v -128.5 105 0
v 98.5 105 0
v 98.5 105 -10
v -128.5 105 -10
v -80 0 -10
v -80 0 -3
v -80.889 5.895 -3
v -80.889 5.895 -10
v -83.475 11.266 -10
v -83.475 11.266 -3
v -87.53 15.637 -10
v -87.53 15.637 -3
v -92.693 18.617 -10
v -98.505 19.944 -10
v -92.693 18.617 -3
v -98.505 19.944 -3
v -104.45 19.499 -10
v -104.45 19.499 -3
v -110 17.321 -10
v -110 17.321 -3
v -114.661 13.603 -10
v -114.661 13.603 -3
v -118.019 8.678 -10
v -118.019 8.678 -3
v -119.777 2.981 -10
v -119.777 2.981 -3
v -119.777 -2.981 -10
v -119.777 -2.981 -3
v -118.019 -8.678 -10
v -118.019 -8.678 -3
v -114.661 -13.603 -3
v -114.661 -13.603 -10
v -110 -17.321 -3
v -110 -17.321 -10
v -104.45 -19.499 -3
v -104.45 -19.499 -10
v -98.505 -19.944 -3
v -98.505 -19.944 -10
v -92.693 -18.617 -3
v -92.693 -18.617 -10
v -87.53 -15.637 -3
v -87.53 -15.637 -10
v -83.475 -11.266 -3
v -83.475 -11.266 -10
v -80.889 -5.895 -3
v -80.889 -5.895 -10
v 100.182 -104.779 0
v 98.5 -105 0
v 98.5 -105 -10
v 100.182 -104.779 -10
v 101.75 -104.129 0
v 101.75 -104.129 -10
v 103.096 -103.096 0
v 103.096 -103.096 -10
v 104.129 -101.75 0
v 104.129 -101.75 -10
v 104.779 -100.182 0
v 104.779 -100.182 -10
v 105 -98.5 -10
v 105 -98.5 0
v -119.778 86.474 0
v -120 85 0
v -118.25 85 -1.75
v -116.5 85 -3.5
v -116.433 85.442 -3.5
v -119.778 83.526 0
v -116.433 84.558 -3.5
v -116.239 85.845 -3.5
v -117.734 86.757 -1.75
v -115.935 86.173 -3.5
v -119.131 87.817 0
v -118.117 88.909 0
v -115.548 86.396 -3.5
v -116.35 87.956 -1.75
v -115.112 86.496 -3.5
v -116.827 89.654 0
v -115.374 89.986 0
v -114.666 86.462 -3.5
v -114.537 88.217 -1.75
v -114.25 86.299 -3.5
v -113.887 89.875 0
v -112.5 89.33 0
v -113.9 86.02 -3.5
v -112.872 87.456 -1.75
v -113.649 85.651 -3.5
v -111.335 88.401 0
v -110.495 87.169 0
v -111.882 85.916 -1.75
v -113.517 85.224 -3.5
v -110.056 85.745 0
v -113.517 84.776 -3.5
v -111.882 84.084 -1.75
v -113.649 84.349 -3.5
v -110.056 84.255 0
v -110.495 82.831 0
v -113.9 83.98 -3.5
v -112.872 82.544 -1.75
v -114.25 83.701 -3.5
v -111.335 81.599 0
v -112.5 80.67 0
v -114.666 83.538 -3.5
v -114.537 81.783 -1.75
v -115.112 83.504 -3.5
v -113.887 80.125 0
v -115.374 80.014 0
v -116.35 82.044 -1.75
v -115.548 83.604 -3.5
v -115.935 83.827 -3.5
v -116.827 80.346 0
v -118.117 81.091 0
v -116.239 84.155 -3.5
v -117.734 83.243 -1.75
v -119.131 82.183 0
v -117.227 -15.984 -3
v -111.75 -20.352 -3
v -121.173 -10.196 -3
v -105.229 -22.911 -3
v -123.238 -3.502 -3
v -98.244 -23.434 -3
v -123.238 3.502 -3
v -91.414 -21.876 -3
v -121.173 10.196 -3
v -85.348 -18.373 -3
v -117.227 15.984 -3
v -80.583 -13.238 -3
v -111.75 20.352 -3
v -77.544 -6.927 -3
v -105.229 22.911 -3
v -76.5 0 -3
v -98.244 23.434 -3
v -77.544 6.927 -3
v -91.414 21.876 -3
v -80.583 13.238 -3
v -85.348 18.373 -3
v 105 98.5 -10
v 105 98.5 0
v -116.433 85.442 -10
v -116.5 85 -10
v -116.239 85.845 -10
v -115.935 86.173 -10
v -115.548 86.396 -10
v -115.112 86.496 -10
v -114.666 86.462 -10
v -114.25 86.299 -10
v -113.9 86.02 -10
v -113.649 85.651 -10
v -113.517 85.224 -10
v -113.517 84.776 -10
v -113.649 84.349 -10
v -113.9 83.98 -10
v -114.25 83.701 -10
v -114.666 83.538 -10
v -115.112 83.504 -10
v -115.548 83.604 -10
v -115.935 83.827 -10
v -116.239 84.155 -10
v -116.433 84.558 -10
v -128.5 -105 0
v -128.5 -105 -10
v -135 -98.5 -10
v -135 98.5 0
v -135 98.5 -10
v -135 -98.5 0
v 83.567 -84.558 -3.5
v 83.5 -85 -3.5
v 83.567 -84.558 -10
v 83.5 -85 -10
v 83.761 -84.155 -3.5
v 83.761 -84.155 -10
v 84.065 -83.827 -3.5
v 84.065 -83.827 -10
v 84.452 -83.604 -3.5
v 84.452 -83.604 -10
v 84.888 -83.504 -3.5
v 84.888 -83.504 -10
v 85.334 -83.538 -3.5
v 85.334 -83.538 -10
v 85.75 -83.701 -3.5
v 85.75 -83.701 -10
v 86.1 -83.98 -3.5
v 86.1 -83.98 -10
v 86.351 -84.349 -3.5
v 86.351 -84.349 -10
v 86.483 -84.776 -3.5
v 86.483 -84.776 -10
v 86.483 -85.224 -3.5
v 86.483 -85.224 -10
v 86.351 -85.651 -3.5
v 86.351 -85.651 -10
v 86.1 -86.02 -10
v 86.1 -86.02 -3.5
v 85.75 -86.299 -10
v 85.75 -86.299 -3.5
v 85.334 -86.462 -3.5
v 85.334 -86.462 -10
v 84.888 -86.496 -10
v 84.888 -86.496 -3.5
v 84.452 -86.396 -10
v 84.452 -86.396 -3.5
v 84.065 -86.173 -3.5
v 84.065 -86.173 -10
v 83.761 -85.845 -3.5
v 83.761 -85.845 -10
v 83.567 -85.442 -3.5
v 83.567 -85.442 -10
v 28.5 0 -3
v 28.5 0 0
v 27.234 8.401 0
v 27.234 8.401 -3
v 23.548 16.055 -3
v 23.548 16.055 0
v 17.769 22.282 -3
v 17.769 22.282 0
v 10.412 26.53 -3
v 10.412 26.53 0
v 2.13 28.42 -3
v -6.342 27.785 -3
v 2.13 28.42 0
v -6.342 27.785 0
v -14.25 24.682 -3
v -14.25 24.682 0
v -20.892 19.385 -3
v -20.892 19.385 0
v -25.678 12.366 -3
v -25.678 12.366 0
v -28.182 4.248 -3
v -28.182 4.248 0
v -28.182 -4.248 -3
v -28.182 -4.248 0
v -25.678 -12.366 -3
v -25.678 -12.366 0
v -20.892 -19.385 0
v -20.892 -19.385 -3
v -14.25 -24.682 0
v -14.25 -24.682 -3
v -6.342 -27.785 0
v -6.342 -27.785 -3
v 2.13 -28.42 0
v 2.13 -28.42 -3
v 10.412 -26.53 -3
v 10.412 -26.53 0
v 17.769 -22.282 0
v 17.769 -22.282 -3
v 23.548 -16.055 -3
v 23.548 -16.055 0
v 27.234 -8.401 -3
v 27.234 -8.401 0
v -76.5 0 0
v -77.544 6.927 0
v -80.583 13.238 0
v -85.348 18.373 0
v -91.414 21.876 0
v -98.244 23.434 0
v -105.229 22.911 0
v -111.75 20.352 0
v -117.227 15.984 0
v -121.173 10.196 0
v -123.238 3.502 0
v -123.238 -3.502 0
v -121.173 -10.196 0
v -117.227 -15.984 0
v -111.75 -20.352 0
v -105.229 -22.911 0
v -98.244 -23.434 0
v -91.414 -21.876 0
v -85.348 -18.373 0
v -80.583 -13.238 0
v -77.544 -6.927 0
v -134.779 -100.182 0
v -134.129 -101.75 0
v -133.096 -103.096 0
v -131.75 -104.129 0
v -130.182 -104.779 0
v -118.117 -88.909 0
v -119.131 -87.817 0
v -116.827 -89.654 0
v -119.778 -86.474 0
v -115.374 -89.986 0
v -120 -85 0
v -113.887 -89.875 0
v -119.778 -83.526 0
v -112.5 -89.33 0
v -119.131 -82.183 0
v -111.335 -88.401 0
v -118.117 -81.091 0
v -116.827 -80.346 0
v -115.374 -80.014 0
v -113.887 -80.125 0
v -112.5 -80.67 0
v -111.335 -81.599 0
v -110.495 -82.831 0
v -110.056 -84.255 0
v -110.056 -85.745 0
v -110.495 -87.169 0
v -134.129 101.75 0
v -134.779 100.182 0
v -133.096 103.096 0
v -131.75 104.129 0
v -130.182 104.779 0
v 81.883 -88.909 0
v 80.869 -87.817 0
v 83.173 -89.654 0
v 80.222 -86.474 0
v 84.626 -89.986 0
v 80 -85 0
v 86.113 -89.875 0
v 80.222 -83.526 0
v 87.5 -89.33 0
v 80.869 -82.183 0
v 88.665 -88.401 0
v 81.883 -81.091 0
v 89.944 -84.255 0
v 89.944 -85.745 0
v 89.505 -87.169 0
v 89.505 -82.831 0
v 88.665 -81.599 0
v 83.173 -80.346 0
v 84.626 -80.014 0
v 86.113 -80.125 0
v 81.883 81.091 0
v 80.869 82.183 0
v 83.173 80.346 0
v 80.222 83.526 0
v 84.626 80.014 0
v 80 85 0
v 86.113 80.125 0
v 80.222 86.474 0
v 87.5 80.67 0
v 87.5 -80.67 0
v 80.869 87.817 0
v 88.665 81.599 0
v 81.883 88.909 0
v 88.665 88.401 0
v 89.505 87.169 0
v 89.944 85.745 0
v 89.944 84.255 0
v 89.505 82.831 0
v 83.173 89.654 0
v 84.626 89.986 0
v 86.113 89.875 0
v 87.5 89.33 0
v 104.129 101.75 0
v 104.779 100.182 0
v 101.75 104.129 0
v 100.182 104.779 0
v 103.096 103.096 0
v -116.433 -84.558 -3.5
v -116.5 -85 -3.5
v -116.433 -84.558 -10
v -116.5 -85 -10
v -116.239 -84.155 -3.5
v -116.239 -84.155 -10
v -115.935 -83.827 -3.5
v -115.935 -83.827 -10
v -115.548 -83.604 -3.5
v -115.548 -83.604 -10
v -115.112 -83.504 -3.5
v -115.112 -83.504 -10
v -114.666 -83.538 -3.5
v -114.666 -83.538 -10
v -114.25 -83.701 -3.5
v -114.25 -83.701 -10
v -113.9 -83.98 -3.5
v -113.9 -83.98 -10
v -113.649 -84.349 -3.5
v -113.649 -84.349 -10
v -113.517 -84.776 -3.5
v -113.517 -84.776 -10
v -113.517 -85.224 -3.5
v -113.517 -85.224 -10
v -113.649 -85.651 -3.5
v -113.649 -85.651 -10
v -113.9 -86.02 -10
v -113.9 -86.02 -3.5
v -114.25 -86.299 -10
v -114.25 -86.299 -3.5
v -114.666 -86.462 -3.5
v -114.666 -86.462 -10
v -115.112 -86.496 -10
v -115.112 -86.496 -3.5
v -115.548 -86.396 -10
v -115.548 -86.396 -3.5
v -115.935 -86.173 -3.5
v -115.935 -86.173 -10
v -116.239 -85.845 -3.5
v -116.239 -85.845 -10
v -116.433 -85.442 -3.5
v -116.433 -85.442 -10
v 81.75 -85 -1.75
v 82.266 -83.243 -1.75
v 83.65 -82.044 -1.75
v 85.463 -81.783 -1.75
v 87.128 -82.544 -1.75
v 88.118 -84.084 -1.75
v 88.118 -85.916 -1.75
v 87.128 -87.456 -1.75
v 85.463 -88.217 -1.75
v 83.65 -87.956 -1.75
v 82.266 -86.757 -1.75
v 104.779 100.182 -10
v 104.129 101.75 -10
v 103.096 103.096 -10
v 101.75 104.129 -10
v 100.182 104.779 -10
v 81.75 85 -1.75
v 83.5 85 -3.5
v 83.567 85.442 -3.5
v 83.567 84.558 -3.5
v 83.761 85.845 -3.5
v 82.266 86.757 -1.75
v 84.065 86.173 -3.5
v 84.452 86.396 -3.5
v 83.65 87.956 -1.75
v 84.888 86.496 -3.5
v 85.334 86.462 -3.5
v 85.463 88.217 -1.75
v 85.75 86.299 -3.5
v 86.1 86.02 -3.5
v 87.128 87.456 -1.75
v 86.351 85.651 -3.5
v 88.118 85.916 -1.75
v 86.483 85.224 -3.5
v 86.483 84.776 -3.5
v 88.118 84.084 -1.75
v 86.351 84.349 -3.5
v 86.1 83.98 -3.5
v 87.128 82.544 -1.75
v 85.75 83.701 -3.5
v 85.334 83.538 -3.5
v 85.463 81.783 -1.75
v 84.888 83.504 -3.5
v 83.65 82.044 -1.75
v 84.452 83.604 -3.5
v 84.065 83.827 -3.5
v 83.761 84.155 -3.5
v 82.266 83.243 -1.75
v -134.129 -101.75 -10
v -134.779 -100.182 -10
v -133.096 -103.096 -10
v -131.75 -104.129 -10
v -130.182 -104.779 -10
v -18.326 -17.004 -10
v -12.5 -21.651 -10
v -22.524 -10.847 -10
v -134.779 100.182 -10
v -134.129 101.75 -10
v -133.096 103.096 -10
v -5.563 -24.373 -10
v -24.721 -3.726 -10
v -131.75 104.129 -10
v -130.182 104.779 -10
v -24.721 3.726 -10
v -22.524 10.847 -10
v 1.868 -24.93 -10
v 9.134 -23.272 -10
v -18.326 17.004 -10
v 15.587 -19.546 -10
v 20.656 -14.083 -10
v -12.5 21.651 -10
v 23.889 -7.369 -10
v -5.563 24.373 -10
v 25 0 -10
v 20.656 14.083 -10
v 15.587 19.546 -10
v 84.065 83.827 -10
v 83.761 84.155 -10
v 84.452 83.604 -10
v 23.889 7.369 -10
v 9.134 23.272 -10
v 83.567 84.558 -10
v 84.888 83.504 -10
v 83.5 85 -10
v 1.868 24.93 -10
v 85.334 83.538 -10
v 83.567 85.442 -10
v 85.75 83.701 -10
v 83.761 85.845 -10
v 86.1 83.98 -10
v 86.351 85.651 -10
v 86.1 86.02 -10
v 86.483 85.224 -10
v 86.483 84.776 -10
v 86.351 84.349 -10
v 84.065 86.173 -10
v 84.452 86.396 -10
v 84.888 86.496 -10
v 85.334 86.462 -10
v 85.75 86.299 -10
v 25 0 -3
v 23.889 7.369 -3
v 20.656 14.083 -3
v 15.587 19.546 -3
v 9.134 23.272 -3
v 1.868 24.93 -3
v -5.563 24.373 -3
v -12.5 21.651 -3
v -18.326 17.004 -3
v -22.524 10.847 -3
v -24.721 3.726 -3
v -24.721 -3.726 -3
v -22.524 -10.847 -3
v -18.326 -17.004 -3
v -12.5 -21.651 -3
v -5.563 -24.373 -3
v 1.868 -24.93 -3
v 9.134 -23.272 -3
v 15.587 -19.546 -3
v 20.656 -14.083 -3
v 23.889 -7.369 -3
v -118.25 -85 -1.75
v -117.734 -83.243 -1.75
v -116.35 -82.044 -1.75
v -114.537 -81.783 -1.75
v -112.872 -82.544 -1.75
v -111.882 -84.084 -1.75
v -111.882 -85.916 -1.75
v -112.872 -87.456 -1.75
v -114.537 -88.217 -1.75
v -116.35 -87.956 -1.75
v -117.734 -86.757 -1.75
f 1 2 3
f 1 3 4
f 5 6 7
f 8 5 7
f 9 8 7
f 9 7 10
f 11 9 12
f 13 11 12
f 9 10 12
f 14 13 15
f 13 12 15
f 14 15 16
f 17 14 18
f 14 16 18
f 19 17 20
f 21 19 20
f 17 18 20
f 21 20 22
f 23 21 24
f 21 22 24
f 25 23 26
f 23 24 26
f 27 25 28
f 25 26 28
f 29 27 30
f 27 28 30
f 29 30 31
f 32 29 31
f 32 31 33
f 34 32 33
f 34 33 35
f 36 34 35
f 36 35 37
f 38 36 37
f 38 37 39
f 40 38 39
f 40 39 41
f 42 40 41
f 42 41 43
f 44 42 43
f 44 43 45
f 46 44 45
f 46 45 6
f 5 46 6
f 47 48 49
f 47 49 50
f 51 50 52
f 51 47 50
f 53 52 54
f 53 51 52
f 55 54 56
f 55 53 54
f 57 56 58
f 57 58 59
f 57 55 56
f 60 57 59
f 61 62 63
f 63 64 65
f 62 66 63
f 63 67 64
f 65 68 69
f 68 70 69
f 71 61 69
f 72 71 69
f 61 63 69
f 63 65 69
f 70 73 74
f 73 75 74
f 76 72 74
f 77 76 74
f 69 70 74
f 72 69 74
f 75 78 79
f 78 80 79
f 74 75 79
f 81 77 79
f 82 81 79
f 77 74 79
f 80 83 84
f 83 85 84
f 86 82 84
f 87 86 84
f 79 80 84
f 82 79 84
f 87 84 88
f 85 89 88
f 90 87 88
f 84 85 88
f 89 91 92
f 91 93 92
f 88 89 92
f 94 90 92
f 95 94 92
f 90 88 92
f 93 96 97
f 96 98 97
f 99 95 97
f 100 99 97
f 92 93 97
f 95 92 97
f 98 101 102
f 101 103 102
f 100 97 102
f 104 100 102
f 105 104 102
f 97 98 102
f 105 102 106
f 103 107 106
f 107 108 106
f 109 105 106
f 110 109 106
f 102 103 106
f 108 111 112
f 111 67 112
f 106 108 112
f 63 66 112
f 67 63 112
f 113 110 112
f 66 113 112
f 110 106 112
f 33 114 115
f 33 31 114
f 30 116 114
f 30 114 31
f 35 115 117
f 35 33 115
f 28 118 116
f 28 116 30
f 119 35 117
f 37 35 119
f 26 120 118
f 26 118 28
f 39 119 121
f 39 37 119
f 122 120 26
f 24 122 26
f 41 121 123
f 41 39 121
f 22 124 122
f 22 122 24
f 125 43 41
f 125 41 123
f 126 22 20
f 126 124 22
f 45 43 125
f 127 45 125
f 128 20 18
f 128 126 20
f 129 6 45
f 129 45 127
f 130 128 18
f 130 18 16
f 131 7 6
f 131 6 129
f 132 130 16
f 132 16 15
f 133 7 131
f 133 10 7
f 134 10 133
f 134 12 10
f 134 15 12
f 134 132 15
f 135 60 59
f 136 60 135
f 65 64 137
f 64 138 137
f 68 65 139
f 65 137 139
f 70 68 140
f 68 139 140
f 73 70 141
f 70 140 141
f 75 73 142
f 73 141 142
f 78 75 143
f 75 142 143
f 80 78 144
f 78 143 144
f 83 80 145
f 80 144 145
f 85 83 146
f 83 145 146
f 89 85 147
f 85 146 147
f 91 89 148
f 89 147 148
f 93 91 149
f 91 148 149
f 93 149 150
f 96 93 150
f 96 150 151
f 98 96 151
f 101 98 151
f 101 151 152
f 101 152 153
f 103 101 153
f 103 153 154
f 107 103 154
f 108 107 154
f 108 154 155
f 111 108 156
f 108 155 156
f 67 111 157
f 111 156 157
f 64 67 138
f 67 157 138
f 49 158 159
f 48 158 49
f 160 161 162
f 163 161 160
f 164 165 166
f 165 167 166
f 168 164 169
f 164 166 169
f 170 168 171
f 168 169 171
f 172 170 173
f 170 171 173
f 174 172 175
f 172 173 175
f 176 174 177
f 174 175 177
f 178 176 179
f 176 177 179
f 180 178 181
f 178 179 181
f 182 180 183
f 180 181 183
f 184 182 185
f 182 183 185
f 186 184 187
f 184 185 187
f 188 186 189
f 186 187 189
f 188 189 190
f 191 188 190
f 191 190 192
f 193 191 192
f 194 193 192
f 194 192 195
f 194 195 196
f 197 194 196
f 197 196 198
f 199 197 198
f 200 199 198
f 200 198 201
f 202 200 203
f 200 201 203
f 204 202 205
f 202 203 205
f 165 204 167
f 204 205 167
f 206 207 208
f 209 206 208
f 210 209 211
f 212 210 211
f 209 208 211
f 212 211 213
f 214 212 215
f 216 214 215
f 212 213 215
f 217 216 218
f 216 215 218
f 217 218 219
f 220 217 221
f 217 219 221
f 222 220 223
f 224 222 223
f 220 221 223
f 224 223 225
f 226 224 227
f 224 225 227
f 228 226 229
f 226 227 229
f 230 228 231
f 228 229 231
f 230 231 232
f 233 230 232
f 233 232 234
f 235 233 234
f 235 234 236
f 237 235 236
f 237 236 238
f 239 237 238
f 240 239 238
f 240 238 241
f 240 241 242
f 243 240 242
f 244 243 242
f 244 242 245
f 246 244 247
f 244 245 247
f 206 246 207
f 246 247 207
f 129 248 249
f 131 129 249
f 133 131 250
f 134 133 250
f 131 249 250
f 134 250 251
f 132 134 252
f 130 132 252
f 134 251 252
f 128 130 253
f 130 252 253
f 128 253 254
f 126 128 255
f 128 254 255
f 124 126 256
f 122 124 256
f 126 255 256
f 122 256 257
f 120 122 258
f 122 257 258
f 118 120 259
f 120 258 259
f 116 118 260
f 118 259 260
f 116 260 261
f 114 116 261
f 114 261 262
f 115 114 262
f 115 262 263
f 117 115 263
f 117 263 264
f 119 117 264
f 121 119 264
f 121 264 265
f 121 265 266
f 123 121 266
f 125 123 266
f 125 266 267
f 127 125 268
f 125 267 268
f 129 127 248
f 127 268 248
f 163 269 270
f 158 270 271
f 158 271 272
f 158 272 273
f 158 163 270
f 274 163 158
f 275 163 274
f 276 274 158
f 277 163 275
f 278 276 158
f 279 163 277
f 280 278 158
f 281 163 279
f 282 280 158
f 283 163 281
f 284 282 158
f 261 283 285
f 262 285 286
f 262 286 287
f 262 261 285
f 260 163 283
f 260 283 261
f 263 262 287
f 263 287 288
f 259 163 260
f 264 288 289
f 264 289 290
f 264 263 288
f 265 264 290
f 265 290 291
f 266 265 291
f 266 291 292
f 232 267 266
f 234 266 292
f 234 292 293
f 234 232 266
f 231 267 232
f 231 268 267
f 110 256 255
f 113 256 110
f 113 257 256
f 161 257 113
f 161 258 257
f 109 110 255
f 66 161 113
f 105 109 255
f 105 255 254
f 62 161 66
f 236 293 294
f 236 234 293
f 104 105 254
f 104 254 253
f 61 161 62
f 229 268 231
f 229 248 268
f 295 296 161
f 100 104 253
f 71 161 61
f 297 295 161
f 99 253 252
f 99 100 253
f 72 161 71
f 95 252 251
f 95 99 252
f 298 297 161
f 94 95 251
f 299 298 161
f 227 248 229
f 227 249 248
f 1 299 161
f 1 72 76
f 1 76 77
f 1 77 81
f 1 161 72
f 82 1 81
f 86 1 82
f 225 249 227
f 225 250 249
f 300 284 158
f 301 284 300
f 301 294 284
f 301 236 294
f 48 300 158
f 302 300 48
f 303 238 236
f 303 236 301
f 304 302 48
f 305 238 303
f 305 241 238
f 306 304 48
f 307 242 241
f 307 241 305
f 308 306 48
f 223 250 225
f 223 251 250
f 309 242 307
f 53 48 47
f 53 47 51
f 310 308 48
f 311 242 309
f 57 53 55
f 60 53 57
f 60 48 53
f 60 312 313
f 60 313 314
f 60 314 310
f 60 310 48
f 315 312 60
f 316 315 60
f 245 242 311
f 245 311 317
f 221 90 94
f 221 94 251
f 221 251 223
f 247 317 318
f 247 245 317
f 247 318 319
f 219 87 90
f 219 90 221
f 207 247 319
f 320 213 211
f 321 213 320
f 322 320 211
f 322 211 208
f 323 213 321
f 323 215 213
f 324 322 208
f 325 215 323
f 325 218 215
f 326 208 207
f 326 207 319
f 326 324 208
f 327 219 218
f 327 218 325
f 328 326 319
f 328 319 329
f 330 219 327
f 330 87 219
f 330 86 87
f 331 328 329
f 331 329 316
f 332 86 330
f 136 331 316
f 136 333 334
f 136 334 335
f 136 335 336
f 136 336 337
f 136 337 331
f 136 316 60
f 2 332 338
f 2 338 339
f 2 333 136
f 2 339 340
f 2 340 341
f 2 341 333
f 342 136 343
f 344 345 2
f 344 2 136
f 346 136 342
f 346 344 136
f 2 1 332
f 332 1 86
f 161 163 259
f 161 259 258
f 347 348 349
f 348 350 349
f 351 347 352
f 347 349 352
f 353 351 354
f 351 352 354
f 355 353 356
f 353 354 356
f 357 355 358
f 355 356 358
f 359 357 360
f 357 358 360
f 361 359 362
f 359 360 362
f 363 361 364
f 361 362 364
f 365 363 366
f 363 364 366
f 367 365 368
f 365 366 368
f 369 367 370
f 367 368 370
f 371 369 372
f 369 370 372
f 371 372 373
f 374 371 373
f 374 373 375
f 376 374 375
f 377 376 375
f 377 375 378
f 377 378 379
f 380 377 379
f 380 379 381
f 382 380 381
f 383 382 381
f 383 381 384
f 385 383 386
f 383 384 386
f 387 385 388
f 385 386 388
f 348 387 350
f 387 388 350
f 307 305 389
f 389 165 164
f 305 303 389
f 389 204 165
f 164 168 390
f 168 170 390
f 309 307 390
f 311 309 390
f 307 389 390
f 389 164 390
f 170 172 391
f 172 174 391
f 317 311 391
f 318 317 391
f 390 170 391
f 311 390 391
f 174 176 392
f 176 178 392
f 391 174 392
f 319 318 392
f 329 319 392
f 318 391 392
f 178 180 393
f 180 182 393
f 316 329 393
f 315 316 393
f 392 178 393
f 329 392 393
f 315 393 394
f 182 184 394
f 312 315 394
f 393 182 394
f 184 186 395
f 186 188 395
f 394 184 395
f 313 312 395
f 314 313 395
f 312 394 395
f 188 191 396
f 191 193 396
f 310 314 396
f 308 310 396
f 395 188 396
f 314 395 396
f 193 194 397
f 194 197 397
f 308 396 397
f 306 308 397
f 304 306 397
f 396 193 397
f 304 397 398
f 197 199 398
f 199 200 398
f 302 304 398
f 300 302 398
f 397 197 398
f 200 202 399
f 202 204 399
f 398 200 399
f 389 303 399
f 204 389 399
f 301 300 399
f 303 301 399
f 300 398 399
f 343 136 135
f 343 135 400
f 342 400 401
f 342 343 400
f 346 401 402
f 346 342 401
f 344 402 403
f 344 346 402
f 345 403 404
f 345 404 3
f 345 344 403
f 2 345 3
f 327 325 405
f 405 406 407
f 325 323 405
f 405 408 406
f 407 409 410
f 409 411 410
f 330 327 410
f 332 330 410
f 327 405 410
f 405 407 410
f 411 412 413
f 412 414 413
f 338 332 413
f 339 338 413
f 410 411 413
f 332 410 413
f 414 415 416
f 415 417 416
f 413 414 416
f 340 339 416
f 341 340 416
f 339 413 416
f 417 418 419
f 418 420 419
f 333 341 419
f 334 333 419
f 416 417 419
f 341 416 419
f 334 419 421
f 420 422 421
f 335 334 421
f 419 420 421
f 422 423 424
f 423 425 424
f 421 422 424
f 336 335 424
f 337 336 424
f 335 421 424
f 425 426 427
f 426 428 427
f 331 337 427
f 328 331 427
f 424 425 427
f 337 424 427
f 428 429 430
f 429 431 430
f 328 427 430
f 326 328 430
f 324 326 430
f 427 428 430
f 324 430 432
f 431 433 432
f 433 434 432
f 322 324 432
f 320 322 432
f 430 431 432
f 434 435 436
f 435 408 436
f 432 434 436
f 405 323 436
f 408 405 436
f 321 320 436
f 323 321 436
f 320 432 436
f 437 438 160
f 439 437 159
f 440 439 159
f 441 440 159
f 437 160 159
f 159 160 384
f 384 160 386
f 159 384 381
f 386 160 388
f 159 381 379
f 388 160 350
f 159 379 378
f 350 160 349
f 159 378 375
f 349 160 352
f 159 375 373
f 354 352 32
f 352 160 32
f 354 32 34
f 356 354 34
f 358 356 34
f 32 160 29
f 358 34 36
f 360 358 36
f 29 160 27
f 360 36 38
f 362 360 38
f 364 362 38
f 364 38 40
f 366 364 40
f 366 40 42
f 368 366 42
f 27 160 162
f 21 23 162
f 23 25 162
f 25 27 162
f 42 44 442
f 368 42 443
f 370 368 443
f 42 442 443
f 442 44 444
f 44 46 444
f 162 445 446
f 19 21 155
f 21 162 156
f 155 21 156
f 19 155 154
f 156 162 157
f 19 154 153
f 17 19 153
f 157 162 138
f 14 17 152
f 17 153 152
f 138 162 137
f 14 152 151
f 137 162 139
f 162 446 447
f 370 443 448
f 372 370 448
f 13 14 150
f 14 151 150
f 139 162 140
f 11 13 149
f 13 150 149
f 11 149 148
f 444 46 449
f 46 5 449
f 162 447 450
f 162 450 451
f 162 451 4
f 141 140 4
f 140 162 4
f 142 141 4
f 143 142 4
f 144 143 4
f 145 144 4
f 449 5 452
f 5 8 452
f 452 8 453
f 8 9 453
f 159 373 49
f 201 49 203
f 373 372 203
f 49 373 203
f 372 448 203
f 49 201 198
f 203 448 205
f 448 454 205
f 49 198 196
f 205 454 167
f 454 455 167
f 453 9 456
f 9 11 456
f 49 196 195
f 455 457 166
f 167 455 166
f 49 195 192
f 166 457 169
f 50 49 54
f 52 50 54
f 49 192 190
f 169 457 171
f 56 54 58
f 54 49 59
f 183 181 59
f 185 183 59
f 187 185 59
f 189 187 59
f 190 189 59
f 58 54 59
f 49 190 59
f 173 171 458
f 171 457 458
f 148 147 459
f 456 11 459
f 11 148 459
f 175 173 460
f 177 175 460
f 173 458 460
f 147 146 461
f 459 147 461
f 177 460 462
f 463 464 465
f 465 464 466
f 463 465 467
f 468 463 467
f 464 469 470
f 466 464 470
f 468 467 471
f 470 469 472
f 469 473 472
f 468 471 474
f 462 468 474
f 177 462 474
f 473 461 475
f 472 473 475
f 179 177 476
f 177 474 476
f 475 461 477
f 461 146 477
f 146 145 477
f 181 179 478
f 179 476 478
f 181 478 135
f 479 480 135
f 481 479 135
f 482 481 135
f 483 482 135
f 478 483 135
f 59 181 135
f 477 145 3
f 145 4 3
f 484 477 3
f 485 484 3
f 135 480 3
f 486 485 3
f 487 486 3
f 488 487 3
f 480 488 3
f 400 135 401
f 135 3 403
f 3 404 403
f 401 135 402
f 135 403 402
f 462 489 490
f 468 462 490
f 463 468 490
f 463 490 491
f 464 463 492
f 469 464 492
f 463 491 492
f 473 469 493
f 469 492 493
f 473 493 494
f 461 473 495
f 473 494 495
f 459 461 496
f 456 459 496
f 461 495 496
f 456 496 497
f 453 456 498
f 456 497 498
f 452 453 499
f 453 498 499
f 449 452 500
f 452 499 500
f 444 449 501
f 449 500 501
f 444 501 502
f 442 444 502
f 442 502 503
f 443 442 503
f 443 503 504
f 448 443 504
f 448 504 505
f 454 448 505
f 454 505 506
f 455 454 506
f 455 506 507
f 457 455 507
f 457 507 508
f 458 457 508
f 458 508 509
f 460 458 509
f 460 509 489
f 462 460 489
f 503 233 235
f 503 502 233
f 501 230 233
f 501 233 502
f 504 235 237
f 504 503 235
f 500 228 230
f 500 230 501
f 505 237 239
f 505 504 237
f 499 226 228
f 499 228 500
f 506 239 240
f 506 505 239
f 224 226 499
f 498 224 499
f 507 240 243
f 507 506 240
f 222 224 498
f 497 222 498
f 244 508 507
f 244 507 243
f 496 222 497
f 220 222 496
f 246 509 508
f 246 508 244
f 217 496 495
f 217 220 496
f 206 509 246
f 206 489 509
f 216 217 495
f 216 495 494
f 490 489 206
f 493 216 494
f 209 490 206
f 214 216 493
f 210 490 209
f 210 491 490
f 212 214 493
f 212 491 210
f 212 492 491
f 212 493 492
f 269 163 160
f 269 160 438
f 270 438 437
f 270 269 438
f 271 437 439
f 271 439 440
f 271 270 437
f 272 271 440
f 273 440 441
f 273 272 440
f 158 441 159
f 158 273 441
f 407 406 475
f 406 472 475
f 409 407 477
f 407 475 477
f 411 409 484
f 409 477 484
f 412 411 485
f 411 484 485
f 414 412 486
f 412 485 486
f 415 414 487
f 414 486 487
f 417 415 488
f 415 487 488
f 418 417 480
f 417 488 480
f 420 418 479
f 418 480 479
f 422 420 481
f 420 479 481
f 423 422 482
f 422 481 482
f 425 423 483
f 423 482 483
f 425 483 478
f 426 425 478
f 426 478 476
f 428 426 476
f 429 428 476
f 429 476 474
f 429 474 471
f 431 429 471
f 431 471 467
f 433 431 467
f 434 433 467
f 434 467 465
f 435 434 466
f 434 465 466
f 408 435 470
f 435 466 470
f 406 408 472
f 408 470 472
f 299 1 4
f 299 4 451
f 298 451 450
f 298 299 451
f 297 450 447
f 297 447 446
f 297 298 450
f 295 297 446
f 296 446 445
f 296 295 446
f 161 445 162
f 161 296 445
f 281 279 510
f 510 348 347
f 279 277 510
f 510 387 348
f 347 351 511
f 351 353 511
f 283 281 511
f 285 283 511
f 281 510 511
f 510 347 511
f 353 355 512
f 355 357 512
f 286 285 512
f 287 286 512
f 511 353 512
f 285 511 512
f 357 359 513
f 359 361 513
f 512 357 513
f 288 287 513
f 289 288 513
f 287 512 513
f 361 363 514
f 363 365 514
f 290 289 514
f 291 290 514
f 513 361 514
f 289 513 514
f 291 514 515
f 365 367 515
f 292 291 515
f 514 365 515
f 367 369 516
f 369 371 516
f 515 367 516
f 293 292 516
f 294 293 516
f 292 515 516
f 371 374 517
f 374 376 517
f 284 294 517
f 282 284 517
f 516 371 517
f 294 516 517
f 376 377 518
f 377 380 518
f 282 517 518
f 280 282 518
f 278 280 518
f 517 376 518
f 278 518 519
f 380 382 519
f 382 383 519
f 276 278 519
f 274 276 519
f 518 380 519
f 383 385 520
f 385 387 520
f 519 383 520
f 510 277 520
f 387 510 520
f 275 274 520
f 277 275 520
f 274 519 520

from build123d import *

# Parameters (mm, degrees)
F0_R           = 20
F0_R_2         = 25
F1_DEPTH       = 10
F2_R           = 23.5
F2_R_2         = 20
F2_R_3         = 28.5
F2_R_4         = 25
F3_DEPTH       = 3
F4_D           = 3
F4_CSINK_D     = 10
F4_CSINK_ANGLE = 90


with BuildPart() as f1:
    # F0 (on Top) → F1 (new body)
    with BuildSketch(Plane.XY):
        with BuildLine():
            Line((98.5, 105), (-128.5, 105))
            ThreePointArc((-128.5, 105), (-133.096194, 103.096194), (-135, 98.5))
            Line((-135, 98.5), (-135, -98.5))
            ThreePointArc((-135, -98.5), (-133.096194, -103.096194), (-128.5, -105))
            Line((-128.5, -105), (98.5, -105))
            ThreePointArc((98.5, -105), (103.096194, -103.096194), (105, -98.5))
            Line((105, -98.5), (105, 98.5))
            ThreePointArc((105, 98.5), (103.096194, 103.096194), (98.5, 105))
        make_face()
        with Locations((-100, 0)):
            Circle(F0_R, mode=Mode.SUBTRACT)
        Circle(F0_R_2, mode=Mode.SUBTRACT)
    extrude(amount=-F1_DEPTH)

    # F2 (on face) → F3 (cut)
    with BuildSketch(Plane.XY):
        with Locations((-100, 0)):
            Circle(F2_R)
        with Locations((-100, 0)):
            Circle(F2_R_2, mode=Mode.SUBTRACT)
        Circle(F2_R_3)
        Circle(F2_R_4, mode=Mode.SUBTRACT)
    extrude(amount=-F3_DEPTH, mode=Mode.SUBTRACT)

    # F4 (through all)
    with Locations(Plane.XY):
        with Locations((-115, 85), (85, 85), (85, -85), (-115, -85)):
            CounterSinkHole(F4_D / 2, F4_CSINK_D / 2, counter_sink_angle=F4_CSINK_ANGLE)


solid = f1.part
